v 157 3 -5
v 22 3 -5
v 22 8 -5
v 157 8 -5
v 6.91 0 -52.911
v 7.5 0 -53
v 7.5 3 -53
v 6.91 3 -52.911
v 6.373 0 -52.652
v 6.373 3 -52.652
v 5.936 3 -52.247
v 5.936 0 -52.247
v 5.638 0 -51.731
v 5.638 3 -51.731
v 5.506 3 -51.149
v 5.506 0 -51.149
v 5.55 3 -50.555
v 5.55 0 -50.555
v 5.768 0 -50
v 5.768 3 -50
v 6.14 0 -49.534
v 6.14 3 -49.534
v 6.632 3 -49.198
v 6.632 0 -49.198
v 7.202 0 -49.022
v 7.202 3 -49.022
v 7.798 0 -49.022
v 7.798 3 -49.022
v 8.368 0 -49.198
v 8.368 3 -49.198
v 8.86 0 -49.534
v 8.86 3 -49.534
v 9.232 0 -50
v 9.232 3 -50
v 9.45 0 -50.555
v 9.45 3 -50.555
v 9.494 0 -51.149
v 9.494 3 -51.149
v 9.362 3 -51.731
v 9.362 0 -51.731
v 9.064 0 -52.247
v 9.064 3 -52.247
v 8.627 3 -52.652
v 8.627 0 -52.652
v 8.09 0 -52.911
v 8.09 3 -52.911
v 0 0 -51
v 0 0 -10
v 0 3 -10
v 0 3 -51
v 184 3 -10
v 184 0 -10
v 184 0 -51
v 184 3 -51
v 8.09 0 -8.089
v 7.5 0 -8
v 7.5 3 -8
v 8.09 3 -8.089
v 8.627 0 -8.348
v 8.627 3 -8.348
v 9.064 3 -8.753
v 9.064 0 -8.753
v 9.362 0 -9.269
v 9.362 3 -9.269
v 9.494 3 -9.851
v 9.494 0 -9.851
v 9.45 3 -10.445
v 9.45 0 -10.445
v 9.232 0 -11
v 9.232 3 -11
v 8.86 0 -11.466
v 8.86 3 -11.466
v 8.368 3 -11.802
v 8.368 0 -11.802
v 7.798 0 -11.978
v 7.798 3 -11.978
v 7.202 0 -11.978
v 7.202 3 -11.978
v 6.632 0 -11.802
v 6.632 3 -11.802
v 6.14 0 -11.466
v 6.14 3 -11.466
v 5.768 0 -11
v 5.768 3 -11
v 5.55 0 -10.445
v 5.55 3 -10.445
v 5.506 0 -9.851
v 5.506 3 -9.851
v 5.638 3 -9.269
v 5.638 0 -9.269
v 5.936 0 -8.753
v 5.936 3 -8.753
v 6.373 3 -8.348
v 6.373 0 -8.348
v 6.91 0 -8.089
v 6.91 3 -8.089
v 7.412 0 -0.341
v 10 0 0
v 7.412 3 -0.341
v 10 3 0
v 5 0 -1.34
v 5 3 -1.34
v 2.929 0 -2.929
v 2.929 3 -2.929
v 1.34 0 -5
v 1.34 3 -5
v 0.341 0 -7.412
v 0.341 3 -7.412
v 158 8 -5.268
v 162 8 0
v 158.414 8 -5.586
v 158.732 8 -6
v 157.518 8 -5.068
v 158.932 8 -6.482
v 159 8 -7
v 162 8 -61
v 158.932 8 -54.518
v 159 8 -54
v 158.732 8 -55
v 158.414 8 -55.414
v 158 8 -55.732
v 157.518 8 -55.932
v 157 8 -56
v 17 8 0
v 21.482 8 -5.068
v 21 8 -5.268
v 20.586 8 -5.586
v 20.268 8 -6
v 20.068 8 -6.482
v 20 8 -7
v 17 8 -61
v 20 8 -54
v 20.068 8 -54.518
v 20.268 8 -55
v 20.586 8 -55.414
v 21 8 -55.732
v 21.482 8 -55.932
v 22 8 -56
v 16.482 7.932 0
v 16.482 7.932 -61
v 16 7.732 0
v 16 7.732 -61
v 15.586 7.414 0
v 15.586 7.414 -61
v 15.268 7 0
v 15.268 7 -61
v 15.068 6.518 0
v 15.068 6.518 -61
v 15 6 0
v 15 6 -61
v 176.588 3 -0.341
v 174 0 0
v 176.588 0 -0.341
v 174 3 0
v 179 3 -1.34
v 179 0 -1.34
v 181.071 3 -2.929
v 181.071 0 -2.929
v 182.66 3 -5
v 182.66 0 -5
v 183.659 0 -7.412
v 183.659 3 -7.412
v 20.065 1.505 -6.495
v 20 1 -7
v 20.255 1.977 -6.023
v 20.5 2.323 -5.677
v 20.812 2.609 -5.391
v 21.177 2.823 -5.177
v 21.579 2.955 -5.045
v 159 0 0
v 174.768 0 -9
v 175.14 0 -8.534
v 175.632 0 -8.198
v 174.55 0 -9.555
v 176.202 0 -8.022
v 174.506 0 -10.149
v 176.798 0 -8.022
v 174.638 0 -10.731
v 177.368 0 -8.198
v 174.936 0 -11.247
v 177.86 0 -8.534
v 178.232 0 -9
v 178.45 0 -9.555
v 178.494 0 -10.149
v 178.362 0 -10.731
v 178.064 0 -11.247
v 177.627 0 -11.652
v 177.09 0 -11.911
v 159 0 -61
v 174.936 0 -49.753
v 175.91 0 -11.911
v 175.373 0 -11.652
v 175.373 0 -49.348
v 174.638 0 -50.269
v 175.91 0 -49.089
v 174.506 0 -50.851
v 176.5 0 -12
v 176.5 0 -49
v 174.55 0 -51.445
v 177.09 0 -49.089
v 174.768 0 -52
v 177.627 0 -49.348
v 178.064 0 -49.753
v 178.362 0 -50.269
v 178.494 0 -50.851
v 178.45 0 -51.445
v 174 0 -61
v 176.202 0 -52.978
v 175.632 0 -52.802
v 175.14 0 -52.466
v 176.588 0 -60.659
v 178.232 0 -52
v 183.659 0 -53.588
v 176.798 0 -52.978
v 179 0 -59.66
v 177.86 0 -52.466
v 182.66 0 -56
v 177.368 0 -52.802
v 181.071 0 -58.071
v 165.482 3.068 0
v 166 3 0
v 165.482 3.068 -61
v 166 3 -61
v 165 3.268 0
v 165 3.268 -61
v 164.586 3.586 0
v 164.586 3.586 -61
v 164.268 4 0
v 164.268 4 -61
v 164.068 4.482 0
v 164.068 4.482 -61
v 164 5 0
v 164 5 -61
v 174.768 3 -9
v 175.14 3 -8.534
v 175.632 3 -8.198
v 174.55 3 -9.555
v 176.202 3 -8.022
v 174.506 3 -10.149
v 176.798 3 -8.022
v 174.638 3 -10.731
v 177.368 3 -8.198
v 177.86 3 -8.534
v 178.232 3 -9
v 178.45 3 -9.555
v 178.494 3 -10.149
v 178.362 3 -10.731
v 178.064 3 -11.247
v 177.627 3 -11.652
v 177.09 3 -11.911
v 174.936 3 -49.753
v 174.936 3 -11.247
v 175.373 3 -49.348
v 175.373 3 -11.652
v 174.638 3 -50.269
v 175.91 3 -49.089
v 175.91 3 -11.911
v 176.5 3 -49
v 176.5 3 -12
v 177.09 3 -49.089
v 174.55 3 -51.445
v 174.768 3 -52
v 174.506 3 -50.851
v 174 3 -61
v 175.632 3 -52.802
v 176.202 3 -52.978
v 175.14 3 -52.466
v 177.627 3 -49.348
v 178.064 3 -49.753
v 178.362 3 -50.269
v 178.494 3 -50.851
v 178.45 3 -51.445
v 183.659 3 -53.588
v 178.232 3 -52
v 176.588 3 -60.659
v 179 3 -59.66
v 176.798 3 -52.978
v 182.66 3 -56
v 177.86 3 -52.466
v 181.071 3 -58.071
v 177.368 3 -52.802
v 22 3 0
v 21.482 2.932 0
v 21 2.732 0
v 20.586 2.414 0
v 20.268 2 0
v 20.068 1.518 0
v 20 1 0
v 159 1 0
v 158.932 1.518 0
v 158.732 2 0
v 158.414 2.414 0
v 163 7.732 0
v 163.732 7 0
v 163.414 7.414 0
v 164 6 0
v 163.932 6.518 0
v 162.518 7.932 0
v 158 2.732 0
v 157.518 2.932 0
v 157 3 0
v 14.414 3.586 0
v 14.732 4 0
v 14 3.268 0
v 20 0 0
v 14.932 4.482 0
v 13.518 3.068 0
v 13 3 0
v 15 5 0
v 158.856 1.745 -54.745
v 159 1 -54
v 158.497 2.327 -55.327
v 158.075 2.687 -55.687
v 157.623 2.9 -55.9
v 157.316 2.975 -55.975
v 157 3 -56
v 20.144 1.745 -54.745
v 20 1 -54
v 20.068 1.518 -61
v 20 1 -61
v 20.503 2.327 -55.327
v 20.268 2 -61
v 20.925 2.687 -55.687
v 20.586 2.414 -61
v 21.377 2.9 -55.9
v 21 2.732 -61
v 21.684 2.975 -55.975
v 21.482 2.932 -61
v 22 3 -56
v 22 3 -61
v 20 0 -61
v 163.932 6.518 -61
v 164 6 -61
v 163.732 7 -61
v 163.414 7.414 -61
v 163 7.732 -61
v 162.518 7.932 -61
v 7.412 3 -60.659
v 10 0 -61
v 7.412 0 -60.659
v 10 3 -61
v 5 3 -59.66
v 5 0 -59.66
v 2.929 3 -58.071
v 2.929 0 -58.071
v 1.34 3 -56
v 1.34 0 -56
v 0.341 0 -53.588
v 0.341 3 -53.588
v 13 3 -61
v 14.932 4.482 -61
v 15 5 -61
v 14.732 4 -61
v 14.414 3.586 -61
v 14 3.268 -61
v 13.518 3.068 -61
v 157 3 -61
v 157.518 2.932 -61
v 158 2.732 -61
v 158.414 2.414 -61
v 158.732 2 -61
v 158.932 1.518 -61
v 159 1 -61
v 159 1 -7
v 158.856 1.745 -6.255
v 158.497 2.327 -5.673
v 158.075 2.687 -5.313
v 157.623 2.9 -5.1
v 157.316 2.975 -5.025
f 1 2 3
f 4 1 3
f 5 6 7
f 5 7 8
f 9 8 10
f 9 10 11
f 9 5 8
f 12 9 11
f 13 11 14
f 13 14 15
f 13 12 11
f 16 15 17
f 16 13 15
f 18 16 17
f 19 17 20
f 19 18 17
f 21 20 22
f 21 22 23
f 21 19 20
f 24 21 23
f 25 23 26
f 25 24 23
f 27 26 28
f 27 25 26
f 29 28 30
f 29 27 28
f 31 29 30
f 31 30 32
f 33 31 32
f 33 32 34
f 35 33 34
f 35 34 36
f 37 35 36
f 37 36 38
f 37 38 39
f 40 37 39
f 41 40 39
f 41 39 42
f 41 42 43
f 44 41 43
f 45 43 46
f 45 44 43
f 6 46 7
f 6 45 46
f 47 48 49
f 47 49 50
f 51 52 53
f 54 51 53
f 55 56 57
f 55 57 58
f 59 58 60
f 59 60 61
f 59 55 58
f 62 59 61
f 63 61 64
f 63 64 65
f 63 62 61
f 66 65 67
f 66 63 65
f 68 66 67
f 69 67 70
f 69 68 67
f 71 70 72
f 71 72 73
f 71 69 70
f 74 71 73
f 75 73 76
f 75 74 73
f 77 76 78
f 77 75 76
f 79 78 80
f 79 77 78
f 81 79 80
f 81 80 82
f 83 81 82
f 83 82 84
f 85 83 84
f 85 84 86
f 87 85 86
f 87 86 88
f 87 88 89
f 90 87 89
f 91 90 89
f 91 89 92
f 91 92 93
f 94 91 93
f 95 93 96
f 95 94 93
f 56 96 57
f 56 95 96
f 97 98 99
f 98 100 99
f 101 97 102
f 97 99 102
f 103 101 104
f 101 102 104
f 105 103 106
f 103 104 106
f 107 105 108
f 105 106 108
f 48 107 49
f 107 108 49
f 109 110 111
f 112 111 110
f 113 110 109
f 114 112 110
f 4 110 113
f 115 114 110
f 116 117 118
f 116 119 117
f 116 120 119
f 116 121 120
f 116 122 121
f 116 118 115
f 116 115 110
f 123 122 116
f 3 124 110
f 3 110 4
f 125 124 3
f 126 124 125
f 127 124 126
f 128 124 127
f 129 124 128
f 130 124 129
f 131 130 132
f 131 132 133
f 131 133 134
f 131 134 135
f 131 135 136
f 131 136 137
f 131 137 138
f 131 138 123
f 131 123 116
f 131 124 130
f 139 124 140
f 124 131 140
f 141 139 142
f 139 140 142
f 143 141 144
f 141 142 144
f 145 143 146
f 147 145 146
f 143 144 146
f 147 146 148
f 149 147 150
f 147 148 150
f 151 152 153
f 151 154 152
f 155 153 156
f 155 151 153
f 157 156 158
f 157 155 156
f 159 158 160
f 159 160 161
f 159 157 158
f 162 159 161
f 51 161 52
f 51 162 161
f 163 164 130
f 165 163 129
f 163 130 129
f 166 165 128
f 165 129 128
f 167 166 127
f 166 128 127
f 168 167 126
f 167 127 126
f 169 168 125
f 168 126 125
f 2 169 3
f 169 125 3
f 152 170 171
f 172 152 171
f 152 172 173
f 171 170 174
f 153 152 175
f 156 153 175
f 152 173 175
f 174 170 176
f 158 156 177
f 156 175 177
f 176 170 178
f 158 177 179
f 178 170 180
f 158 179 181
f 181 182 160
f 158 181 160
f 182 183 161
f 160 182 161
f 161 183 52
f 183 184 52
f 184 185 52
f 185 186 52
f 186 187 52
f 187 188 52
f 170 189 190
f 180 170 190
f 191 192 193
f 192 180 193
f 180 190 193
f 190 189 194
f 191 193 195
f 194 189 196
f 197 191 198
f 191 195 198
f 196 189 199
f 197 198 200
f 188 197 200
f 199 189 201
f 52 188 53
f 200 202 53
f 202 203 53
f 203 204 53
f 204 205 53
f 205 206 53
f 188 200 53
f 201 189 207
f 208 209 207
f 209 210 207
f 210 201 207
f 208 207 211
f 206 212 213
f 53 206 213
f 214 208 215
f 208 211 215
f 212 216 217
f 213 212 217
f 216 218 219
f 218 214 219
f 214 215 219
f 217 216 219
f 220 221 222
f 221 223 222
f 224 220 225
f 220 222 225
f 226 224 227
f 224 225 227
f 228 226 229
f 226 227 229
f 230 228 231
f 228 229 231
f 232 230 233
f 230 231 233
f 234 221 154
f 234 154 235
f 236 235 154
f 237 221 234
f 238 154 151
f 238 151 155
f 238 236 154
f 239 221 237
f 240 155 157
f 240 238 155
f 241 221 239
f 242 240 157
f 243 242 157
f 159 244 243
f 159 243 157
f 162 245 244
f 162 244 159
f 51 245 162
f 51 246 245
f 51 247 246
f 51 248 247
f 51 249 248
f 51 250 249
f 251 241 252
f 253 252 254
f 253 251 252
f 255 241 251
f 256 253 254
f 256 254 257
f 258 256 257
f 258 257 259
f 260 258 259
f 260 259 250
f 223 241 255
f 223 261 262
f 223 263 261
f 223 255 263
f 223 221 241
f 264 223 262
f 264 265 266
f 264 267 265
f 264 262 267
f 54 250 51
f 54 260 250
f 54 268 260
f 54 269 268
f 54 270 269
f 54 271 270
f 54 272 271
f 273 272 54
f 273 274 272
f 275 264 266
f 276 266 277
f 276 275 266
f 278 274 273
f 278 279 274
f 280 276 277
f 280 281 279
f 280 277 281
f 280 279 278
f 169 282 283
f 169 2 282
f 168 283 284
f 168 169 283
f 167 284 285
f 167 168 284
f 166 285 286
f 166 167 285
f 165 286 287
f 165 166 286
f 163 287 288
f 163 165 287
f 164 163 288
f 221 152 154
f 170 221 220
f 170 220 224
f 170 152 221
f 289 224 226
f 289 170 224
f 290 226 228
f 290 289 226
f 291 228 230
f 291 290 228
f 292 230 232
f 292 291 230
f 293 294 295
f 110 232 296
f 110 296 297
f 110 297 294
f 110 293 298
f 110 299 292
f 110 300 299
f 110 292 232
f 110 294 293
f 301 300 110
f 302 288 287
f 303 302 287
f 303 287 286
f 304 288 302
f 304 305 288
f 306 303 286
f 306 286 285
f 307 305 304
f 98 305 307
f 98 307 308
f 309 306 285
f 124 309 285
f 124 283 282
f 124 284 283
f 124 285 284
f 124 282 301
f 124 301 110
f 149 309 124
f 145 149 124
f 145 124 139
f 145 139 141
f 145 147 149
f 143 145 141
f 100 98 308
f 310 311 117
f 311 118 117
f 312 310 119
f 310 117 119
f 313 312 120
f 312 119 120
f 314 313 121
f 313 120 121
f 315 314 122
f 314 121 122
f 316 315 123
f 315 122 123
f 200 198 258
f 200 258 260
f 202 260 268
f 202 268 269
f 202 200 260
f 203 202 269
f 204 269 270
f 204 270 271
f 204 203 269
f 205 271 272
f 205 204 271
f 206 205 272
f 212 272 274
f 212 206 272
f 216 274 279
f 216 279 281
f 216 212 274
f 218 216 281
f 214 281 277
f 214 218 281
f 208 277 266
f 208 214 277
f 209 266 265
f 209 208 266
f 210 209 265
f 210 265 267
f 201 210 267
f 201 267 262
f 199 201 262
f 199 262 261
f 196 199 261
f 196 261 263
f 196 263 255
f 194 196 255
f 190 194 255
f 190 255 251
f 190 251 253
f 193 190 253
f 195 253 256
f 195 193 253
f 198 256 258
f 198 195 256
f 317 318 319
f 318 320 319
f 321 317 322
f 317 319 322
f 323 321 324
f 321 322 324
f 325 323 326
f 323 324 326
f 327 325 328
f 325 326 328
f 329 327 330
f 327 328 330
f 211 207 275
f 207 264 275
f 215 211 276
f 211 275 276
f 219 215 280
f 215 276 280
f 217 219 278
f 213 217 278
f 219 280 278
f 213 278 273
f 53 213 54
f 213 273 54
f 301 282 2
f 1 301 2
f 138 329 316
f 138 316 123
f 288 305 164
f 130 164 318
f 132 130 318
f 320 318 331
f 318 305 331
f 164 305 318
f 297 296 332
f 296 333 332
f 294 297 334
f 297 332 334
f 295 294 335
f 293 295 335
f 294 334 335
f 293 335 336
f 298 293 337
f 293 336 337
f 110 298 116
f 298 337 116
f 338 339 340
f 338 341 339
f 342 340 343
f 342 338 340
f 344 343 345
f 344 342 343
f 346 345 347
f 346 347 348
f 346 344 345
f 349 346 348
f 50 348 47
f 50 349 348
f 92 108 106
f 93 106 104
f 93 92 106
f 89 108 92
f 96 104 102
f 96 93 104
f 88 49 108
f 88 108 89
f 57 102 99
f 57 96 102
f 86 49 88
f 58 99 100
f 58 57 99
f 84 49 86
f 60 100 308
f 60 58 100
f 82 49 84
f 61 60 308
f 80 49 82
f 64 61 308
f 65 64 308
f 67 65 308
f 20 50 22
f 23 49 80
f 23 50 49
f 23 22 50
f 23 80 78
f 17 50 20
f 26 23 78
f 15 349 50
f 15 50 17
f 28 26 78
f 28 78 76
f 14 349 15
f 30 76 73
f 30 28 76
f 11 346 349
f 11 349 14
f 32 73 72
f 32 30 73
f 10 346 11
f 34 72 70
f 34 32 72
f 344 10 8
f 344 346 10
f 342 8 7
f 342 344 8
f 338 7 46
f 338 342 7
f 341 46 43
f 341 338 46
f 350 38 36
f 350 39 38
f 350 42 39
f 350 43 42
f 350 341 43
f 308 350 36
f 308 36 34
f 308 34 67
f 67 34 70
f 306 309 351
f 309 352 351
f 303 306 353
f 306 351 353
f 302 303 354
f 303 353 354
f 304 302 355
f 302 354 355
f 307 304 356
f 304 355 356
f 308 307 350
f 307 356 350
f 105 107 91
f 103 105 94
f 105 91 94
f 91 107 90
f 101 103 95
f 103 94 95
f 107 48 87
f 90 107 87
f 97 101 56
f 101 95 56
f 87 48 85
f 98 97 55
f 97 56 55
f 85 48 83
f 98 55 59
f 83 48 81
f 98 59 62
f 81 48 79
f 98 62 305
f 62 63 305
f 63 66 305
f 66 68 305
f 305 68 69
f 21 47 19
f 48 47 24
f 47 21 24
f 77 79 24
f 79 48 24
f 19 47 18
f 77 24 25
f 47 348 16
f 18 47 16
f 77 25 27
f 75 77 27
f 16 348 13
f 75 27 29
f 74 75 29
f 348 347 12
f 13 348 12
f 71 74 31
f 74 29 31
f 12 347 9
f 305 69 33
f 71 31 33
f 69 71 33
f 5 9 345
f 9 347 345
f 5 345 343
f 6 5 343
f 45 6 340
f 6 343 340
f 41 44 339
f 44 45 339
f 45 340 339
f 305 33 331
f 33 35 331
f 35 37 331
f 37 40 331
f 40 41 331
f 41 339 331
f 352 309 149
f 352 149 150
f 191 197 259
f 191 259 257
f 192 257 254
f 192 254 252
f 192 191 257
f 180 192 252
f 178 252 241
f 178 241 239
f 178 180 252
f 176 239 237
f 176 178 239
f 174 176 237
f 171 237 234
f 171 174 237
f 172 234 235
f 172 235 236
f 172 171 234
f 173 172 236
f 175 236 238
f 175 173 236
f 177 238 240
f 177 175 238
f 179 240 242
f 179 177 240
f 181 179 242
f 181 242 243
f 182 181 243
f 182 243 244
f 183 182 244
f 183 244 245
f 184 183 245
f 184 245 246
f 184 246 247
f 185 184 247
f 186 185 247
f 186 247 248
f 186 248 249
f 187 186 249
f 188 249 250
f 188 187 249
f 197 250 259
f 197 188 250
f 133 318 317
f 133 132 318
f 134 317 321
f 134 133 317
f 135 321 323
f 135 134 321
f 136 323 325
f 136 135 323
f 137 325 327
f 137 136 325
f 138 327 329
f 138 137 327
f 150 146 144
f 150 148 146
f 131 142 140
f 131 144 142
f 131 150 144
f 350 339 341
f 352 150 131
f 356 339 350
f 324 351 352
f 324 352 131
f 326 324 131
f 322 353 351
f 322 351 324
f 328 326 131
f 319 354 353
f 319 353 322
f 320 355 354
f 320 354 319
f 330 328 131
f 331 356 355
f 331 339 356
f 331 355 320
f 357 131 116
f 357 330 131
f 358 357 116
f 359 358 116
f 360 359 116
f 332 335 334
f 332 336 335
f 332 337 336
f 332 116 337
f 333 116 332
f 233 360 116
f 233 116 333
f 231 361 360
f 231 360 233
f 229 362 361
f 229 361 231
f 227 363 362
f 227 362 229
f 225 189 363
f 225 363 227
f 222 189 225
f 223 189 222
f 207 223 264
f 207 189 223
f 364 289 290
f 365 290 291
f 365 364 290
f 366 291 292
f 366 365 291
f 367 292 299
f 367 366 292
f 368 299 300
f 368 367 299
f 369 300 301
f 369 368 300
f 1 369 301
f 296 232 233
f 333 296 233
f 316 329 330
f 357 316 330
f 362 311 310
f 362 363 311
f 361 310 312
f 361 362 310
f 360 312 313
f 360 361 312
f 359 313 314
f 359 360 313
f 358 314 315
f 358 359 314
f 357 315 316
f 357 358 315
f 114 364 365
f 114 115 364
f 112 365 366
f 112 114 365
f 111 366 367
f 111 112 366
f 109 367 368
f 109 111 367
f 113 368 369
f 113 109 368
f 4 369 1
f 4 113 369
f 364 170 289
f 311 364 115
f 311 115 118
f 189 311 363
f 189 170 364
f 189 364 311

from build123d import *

# Parameters (mm, degrees)
SKETCH1_W             = 25
SKETCH1_H             = 61
SKETCH1_R             = 2
BOSS_EXTRUDE1_DEPTH   = 3
SKETCH1_W_2           = 20
BOSS_EXTRUDE1_2_DEPTH = 3
SKETCH3_W             = 5
SKETCH3_H             = 61
BOSS_EXTRUDE2_DEPTH   = 5
SKETCH4_W             = 5
SKETCH4_H             = 5
BOSS_EXTRUDE3_DEPTH   = 139
FILLET1_R             = 10
FILLET2_R             = 2


with BuildPart() as part:
    # Sketch1 → Boss-Extrude1 (new body)
    with BuildSketch(Plane(origin=(0, 0, 0), x_dir=(1, 0, 0), z_dir=(0, 1, 0))):
        with Locations((171.5, 30.5)):
            Rectangle(SKETCH1_W, SKETCH1_H)
        with Locations(Location((176.5, 10, 0), (0, 0, 90))):
            Circle(SKETCH1_R, mode=Mode.SUBTRACT)
        with Locations(Location((176.5, 51, 0), (0, 0, 270))):
            Circle(SKETCH1_R, mode=Mode.SUBTRACT)
    extrude(amount=BOSS_EXTRUDE1_DEPTH)



with BuildPart() as body_2:
    # Sketch1 → Boss-Extrude1 2 (new body)
    with BuildSketch(Plane(origin=(0, 0, 0), x_dir=(1, 0, 0), z_dir=(0, 1, 0))):
        with Locations((10, 30.5)):
            Rectangle(SKETCH1_W_2, SKETCH1_H)
        with Locations(Location((7.5, 10, 0), (0, 0, 270))):
            Circle(SKETCH1_R, mode=Mode.SUBTRACT)
        with Locations(Location((7.5, 51, 0), (0, 0, 90))):
            Circle(SKETCH1_R, mode=Mode.SUBTRACT)
    extrude(amount=BOSS_EXTRUDE1_2_DEPTH)


with BuildPart() as part_1:
    add(part.part)

    add(body_2.part)  # Boss-Extrude2 merges body 2
    # Sketch3 → Boss-Extrude2 (add)
    with BuildSketch(Plane(origin=(0, 3, 0), x_dir=(1, 0, 0), z_dir=(0, 1, 0))):
        with Locations((17.5, 30.5)):
            Rectangle(SKETCH3_W, SKETCH3_H)
        with Locations((161.5, 30.5)):
            Rectangle(SKETCH3_W, SKETCH3_H)
    extrude(amount=BOSS_EXTRUDE2_DEPTH)

    # Sketch4 → Boss-Extrude3 (add)
    with BuildSketch(Plane(origin=(20, 0, 0), x_dir=(0, 0, -1), z_dir=(1, 0, 0))):
        with Locations((2.5, 5.5)):
            Rectangle(SKETCH4_W, SKETCH4_H)
        with Locations((58.5, 5.5)):
            Rectangle(SKETCH4_W, SKETCH4_H)
    extrude(amount=BOSS_EXTRUDE3_DEPTH)

    # Fillet1
    fillet1_edges = [part_1.edges().sort_by_distance(p)[0] for p in [
        (184, 1.5, 0),
        (184, 1.5, -61),
        (0, 1.5, 0),
        (0, 1.5, -61),
    ]]
    fillet(fillet1_edges, radius=FILLET1_R)

    # Fillet2
    fillet2_edges = [part_1.edges().sort_by_distance(p)[0] for p in [
        (15, 3, -30.5),
        (15, 8, -30.5),
        (20, 3, -2.5),
        (20, 5.5, -5),
        (159, 3, -2.5),
        (159, 5.5, -5),
        (164, 3, -30.5),
        (164, 8, -30.5),
        (20, 5.5, -56),
        (20, 3, -58.5),
        (159, 3, -58.5),
        (159, 5.5, -56),
    ]]
    fillet(fillet2_edges, radius=FILLET2_R)


solid = part_1.part
